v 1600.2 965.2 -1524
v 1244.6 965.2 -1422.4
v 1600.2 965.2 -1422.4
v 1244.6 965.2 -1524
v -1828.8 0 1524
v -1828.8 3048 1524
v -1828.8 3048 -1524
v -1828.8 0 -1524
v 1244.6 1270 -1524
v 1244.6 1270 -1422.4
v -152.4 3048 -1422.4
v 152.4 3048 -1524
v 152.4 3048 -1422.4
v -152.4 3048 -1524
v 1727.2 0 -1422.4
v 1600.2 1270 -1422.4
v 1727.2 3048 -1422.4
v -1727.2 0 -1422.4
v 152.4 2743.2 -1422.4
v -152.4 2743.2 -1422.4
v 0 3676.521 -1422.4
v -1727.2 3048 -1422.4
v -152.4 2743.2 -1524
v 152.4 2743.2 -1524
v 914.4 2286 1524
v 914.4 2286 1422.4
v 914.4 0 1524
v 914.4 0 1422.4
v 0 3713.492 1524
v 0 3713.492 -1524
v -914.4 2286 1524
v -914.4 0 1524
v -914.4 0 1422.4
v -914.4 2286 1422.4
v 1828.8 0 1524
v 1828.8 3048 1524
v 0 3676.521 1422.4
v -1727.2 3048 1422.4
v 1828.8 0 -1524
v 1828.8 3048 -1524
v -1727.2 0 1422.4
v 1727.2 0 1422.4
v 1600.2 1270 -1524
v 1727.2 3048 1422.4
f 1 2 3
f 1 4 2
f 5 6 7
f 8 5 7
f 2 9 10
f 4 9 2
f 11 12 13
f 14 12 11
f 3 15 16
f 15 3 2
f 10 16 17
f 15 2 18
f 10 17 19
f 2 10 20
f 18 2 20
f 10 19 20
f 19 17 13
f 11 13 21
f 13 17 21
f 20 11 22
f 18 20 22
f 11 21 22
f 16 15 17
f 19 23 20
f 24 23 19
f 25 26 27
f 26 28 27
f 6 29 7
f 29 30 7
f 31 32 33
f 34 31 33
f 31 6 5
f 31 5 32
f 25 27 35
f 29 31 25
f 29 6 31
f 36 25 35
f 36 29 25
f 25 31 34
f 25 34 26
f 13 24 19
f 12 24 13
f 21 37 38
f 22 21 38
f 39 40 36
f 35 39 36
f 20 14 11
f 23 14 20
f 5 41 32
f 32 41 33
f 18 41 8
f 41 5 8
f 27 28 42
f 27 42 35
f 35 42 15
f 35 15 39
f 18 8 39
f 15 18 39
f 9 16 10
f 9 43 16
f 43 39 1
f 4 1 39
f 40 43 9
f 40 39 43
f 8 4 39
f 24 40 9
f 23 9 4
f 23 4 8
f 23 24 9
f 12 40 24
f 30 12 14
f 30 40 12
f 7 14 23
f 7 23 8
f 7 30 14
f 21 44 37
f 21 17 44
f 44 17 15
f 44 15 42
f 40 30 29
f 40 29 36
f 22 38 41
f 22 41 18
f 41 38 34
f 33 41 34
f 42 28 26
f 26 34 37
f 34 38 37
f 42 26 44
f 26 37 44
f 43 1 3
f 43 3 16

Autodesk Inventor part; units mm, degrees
ref_plane "YZ Plane" through (0, 0, 0) normal (1, 0, 0) x (0, 1, 0)
ref_plane "XZ Plane" through (0, 0, 0) normal (0, 1, 0) x (-1, 0, 0)
ref_plane "XY Plane" through (0, 0, 0) normal (0, 0, 1) x (1, 0, 0)
ref_plane "Work Plane1" through (-1828.8, 0, 1524) normal (0, 1, 0) x (1, 0, 0)
sketch "Sketch13" plane through (-1828.8, 0, 1524) normal (0, 1, 0) x (1, 0, 0)
  line L0 (0, 0) -> (0, 3048) projected
  line L1 (0, 0) -> (914.4, 0)
  line L2 (3657.6, 0) -> (0, 0) projected
  line L3 (914.4, 101.6) -> (101.6, 101.6)
  line L4 (101.6, 101.6) -> (101.6, 2946.4)
  line L5 (101.6, 2946.4) -> (3556, 2946.4)
  line L6 (3556, 2946.4) -> (3556, 101.6)
  line L7 (3556, 101.6) -> (2743.2, 101.6)
  line L8 (2743.2, 101.6) -> (2743.2, 0)
  line L9 (914.4, 0) -> (914.4, 101.6)
  line L10 (3657.6, 3048) -> (3657.6, 0) projected
  line L11 (0, 3048) -> (3657.6, 3048) projected
  point P0 (1828.8, 1524)
  dimension "d25" = 101.6
  dimension "d26" = 914.4
  dimension "d27" = 101.6
  dimension "d28" = 101.6
  dimension "d29" = 101.6
extrude "Extrusion9" add sketch "Sketch13" along normal blind 3048 contours L0 L11 L10 L2 L8 L7 L6 L5 L4 L3 L9 L1
ref_plane "Work Plane3" through (-1828.8, -38.1, 1524) normal (0, 0, 1) x (1, 0, 0)
sketch "Sketch14" plane through (-1828.8, -38.1, 1524) normal (0, 0, 1) x (1, 0, 0)
  line L0 (914.4, 38.1) -> (914.4, 3086.1) projected
  line L1 (914.4, 2324.1) -> (2743.2, 2324.1)
  line L2 (2743.2, 38.1) -> (2743.2, 3086.1) projected
  line L3 (2743.2, 38.1) -> (914.4, 38.1) projected
  line L4 (914.4, 3086.1) -> (2743.2, 3086.1)
  point P0 (1828.8, 38.1)
  dimension "d32" = 2286
extrude "Extrusion10" add sketch "Sketch14" against normal blind 101.6 contours L0 L4 L2 L1
ref_plane "Work Plane4" through (-1828.8, -38.1, 1524) normal (0, 0, 1) x (1, 0, 0)
sketch "Sketch15" plane through (-1828.8, -38.1, 1524) normal (0, 0, 1) x (1, 0, 0)
  line L0 (3657.6, 3086.1) -> (0, 3086.1) projected
  line L1 (0, 3086.1) -> (1828.8, 3751.5924)
  line L2 (1828.8, 3751.5924) -> (3657.6, 3086.1)
  point P0 (1828.8, 38.1)
  dimension "d35" = 19.996
extrude "Extrusion11" add sketch "Sketch15" against normal blind 101.6
ref_plane "Work Plane2" through (1828.8, -38.1, -1524) normal (0, 0, -1) x (-1, 0, 0)
sketch "Sketch17" plane through (1828.8, -38.1, -1524) normal (0, 0, -1) x (-1, 0, 0)
  line L0 (63.5, 3086.1) -> (0, 3086.1) projected
  line L1 (1828.8, 3751.5924) -> (0, 3086.1) projected
  line L2 (0, 3086.1) -> (1828.8, 3751.5924)
  line L3 (3657.6, 0) -> (3657.6, 3086.1) projected
  line L4 (1828.8, 3751.5924) -> (3657.6, 3086.1)
  line L5 (0, 3086.1) -> (3657.6, 3086.1)
  point P0 (1828.8, 38.1)
extrude "Extrusion12" add sketch "Sketch17" against normal blind 101.6
sketch "Sketch19" plane through (1828.8, 0, -1524) normal (0, 0, -1) x (-1, 0, 0)
  line L0 (0, 3048) -> (101.6, 3048) projected
  line L1 (0, 3048) -> (101.6, 3048)
  line L2 (101.6, 3048) -> (1828.8, 3676.5206)
  line L3 (3556, 0) -> (3556, 3048) projected
  line L4 (1828.8, 3676.5206) -> (3556, 3048)
  line L5 (1828.8, 3713.4924) -> (3657.6, 3048) projected
  line L6 (3556, 3048) -> (3657.6, 3048)
  line L7 (3657.6, 3048) -> (1828.8, 3713.4924)
  line L8 (1828.8, 3713.4924) -> (0, 3048)
  point P0 (1828.8, 0)
extrude "Extrusion14" add sketch "Sketch19" against normal blind 3048
sketch "Sketch20" plane through (1828.8, 0, -1524) normal (0, 0, -1) x (-1, 0, 0)
  line L0 (228.6, 1270) -> (584.2, 1270)
  line L1 (584.2, 1270) -> (584.2, 965.2)
  line L2 (584.2, 965.2) -> (228.6, 965.2)
  line L3 (228.6, 965.2) -> (228.6, 1270)
  line L4 (0, 0) -> (0, 3048) projected
  line L5 (0, 0) -> (3657.6, 0) projected
  point P0 (1828.8, 0)
  point P1 (228.6, 1117.6)
  dimension "d44" = 228.6
  dimension "d45" = 355.6
  dimension "d46" = 304.8
  dimension "d47" = 965.2
extrude "Extrusion15" cut sketch "Sketch20" against normal blind 101.6
sketch "Sketch21" plane through (1828.8, 0, -1524) normal (0, 0, -1) x (-1, 0, 0)
  line L0 (1676.4, 3048) -> (1981.2, 3048)
  line L1 (1981.2, 3048) -> (1981.2, 2743.2)
  line L2 (1981.2, 2743.2) -> (1676.4, 2743.2)
  line L3 (1676.4, 2743.2) -> (1676.4, 3048)
  line L4 (3657.6, 3048) -> (1828.8, 3713.4924) projected
  line L5 (1828.8, 3713.4924) -> (1828.8, 2743.2) construction
  line L6 (0, 0) -> (0, 3048) projected
  line L7 (3657.6, 0) -> (3657.6, 3048) projected
  line L8 (0, 3048) -> (3657.6, 3048) construction
  point P0 (1828.8, 0)
  dimension "d50" = 304.8
  dimension "d51" = 304.8
extrude "Extrusion16" cut sketch "Sketch21" against normal blind 101.6
properties part number "HCRO Shed_v0"
